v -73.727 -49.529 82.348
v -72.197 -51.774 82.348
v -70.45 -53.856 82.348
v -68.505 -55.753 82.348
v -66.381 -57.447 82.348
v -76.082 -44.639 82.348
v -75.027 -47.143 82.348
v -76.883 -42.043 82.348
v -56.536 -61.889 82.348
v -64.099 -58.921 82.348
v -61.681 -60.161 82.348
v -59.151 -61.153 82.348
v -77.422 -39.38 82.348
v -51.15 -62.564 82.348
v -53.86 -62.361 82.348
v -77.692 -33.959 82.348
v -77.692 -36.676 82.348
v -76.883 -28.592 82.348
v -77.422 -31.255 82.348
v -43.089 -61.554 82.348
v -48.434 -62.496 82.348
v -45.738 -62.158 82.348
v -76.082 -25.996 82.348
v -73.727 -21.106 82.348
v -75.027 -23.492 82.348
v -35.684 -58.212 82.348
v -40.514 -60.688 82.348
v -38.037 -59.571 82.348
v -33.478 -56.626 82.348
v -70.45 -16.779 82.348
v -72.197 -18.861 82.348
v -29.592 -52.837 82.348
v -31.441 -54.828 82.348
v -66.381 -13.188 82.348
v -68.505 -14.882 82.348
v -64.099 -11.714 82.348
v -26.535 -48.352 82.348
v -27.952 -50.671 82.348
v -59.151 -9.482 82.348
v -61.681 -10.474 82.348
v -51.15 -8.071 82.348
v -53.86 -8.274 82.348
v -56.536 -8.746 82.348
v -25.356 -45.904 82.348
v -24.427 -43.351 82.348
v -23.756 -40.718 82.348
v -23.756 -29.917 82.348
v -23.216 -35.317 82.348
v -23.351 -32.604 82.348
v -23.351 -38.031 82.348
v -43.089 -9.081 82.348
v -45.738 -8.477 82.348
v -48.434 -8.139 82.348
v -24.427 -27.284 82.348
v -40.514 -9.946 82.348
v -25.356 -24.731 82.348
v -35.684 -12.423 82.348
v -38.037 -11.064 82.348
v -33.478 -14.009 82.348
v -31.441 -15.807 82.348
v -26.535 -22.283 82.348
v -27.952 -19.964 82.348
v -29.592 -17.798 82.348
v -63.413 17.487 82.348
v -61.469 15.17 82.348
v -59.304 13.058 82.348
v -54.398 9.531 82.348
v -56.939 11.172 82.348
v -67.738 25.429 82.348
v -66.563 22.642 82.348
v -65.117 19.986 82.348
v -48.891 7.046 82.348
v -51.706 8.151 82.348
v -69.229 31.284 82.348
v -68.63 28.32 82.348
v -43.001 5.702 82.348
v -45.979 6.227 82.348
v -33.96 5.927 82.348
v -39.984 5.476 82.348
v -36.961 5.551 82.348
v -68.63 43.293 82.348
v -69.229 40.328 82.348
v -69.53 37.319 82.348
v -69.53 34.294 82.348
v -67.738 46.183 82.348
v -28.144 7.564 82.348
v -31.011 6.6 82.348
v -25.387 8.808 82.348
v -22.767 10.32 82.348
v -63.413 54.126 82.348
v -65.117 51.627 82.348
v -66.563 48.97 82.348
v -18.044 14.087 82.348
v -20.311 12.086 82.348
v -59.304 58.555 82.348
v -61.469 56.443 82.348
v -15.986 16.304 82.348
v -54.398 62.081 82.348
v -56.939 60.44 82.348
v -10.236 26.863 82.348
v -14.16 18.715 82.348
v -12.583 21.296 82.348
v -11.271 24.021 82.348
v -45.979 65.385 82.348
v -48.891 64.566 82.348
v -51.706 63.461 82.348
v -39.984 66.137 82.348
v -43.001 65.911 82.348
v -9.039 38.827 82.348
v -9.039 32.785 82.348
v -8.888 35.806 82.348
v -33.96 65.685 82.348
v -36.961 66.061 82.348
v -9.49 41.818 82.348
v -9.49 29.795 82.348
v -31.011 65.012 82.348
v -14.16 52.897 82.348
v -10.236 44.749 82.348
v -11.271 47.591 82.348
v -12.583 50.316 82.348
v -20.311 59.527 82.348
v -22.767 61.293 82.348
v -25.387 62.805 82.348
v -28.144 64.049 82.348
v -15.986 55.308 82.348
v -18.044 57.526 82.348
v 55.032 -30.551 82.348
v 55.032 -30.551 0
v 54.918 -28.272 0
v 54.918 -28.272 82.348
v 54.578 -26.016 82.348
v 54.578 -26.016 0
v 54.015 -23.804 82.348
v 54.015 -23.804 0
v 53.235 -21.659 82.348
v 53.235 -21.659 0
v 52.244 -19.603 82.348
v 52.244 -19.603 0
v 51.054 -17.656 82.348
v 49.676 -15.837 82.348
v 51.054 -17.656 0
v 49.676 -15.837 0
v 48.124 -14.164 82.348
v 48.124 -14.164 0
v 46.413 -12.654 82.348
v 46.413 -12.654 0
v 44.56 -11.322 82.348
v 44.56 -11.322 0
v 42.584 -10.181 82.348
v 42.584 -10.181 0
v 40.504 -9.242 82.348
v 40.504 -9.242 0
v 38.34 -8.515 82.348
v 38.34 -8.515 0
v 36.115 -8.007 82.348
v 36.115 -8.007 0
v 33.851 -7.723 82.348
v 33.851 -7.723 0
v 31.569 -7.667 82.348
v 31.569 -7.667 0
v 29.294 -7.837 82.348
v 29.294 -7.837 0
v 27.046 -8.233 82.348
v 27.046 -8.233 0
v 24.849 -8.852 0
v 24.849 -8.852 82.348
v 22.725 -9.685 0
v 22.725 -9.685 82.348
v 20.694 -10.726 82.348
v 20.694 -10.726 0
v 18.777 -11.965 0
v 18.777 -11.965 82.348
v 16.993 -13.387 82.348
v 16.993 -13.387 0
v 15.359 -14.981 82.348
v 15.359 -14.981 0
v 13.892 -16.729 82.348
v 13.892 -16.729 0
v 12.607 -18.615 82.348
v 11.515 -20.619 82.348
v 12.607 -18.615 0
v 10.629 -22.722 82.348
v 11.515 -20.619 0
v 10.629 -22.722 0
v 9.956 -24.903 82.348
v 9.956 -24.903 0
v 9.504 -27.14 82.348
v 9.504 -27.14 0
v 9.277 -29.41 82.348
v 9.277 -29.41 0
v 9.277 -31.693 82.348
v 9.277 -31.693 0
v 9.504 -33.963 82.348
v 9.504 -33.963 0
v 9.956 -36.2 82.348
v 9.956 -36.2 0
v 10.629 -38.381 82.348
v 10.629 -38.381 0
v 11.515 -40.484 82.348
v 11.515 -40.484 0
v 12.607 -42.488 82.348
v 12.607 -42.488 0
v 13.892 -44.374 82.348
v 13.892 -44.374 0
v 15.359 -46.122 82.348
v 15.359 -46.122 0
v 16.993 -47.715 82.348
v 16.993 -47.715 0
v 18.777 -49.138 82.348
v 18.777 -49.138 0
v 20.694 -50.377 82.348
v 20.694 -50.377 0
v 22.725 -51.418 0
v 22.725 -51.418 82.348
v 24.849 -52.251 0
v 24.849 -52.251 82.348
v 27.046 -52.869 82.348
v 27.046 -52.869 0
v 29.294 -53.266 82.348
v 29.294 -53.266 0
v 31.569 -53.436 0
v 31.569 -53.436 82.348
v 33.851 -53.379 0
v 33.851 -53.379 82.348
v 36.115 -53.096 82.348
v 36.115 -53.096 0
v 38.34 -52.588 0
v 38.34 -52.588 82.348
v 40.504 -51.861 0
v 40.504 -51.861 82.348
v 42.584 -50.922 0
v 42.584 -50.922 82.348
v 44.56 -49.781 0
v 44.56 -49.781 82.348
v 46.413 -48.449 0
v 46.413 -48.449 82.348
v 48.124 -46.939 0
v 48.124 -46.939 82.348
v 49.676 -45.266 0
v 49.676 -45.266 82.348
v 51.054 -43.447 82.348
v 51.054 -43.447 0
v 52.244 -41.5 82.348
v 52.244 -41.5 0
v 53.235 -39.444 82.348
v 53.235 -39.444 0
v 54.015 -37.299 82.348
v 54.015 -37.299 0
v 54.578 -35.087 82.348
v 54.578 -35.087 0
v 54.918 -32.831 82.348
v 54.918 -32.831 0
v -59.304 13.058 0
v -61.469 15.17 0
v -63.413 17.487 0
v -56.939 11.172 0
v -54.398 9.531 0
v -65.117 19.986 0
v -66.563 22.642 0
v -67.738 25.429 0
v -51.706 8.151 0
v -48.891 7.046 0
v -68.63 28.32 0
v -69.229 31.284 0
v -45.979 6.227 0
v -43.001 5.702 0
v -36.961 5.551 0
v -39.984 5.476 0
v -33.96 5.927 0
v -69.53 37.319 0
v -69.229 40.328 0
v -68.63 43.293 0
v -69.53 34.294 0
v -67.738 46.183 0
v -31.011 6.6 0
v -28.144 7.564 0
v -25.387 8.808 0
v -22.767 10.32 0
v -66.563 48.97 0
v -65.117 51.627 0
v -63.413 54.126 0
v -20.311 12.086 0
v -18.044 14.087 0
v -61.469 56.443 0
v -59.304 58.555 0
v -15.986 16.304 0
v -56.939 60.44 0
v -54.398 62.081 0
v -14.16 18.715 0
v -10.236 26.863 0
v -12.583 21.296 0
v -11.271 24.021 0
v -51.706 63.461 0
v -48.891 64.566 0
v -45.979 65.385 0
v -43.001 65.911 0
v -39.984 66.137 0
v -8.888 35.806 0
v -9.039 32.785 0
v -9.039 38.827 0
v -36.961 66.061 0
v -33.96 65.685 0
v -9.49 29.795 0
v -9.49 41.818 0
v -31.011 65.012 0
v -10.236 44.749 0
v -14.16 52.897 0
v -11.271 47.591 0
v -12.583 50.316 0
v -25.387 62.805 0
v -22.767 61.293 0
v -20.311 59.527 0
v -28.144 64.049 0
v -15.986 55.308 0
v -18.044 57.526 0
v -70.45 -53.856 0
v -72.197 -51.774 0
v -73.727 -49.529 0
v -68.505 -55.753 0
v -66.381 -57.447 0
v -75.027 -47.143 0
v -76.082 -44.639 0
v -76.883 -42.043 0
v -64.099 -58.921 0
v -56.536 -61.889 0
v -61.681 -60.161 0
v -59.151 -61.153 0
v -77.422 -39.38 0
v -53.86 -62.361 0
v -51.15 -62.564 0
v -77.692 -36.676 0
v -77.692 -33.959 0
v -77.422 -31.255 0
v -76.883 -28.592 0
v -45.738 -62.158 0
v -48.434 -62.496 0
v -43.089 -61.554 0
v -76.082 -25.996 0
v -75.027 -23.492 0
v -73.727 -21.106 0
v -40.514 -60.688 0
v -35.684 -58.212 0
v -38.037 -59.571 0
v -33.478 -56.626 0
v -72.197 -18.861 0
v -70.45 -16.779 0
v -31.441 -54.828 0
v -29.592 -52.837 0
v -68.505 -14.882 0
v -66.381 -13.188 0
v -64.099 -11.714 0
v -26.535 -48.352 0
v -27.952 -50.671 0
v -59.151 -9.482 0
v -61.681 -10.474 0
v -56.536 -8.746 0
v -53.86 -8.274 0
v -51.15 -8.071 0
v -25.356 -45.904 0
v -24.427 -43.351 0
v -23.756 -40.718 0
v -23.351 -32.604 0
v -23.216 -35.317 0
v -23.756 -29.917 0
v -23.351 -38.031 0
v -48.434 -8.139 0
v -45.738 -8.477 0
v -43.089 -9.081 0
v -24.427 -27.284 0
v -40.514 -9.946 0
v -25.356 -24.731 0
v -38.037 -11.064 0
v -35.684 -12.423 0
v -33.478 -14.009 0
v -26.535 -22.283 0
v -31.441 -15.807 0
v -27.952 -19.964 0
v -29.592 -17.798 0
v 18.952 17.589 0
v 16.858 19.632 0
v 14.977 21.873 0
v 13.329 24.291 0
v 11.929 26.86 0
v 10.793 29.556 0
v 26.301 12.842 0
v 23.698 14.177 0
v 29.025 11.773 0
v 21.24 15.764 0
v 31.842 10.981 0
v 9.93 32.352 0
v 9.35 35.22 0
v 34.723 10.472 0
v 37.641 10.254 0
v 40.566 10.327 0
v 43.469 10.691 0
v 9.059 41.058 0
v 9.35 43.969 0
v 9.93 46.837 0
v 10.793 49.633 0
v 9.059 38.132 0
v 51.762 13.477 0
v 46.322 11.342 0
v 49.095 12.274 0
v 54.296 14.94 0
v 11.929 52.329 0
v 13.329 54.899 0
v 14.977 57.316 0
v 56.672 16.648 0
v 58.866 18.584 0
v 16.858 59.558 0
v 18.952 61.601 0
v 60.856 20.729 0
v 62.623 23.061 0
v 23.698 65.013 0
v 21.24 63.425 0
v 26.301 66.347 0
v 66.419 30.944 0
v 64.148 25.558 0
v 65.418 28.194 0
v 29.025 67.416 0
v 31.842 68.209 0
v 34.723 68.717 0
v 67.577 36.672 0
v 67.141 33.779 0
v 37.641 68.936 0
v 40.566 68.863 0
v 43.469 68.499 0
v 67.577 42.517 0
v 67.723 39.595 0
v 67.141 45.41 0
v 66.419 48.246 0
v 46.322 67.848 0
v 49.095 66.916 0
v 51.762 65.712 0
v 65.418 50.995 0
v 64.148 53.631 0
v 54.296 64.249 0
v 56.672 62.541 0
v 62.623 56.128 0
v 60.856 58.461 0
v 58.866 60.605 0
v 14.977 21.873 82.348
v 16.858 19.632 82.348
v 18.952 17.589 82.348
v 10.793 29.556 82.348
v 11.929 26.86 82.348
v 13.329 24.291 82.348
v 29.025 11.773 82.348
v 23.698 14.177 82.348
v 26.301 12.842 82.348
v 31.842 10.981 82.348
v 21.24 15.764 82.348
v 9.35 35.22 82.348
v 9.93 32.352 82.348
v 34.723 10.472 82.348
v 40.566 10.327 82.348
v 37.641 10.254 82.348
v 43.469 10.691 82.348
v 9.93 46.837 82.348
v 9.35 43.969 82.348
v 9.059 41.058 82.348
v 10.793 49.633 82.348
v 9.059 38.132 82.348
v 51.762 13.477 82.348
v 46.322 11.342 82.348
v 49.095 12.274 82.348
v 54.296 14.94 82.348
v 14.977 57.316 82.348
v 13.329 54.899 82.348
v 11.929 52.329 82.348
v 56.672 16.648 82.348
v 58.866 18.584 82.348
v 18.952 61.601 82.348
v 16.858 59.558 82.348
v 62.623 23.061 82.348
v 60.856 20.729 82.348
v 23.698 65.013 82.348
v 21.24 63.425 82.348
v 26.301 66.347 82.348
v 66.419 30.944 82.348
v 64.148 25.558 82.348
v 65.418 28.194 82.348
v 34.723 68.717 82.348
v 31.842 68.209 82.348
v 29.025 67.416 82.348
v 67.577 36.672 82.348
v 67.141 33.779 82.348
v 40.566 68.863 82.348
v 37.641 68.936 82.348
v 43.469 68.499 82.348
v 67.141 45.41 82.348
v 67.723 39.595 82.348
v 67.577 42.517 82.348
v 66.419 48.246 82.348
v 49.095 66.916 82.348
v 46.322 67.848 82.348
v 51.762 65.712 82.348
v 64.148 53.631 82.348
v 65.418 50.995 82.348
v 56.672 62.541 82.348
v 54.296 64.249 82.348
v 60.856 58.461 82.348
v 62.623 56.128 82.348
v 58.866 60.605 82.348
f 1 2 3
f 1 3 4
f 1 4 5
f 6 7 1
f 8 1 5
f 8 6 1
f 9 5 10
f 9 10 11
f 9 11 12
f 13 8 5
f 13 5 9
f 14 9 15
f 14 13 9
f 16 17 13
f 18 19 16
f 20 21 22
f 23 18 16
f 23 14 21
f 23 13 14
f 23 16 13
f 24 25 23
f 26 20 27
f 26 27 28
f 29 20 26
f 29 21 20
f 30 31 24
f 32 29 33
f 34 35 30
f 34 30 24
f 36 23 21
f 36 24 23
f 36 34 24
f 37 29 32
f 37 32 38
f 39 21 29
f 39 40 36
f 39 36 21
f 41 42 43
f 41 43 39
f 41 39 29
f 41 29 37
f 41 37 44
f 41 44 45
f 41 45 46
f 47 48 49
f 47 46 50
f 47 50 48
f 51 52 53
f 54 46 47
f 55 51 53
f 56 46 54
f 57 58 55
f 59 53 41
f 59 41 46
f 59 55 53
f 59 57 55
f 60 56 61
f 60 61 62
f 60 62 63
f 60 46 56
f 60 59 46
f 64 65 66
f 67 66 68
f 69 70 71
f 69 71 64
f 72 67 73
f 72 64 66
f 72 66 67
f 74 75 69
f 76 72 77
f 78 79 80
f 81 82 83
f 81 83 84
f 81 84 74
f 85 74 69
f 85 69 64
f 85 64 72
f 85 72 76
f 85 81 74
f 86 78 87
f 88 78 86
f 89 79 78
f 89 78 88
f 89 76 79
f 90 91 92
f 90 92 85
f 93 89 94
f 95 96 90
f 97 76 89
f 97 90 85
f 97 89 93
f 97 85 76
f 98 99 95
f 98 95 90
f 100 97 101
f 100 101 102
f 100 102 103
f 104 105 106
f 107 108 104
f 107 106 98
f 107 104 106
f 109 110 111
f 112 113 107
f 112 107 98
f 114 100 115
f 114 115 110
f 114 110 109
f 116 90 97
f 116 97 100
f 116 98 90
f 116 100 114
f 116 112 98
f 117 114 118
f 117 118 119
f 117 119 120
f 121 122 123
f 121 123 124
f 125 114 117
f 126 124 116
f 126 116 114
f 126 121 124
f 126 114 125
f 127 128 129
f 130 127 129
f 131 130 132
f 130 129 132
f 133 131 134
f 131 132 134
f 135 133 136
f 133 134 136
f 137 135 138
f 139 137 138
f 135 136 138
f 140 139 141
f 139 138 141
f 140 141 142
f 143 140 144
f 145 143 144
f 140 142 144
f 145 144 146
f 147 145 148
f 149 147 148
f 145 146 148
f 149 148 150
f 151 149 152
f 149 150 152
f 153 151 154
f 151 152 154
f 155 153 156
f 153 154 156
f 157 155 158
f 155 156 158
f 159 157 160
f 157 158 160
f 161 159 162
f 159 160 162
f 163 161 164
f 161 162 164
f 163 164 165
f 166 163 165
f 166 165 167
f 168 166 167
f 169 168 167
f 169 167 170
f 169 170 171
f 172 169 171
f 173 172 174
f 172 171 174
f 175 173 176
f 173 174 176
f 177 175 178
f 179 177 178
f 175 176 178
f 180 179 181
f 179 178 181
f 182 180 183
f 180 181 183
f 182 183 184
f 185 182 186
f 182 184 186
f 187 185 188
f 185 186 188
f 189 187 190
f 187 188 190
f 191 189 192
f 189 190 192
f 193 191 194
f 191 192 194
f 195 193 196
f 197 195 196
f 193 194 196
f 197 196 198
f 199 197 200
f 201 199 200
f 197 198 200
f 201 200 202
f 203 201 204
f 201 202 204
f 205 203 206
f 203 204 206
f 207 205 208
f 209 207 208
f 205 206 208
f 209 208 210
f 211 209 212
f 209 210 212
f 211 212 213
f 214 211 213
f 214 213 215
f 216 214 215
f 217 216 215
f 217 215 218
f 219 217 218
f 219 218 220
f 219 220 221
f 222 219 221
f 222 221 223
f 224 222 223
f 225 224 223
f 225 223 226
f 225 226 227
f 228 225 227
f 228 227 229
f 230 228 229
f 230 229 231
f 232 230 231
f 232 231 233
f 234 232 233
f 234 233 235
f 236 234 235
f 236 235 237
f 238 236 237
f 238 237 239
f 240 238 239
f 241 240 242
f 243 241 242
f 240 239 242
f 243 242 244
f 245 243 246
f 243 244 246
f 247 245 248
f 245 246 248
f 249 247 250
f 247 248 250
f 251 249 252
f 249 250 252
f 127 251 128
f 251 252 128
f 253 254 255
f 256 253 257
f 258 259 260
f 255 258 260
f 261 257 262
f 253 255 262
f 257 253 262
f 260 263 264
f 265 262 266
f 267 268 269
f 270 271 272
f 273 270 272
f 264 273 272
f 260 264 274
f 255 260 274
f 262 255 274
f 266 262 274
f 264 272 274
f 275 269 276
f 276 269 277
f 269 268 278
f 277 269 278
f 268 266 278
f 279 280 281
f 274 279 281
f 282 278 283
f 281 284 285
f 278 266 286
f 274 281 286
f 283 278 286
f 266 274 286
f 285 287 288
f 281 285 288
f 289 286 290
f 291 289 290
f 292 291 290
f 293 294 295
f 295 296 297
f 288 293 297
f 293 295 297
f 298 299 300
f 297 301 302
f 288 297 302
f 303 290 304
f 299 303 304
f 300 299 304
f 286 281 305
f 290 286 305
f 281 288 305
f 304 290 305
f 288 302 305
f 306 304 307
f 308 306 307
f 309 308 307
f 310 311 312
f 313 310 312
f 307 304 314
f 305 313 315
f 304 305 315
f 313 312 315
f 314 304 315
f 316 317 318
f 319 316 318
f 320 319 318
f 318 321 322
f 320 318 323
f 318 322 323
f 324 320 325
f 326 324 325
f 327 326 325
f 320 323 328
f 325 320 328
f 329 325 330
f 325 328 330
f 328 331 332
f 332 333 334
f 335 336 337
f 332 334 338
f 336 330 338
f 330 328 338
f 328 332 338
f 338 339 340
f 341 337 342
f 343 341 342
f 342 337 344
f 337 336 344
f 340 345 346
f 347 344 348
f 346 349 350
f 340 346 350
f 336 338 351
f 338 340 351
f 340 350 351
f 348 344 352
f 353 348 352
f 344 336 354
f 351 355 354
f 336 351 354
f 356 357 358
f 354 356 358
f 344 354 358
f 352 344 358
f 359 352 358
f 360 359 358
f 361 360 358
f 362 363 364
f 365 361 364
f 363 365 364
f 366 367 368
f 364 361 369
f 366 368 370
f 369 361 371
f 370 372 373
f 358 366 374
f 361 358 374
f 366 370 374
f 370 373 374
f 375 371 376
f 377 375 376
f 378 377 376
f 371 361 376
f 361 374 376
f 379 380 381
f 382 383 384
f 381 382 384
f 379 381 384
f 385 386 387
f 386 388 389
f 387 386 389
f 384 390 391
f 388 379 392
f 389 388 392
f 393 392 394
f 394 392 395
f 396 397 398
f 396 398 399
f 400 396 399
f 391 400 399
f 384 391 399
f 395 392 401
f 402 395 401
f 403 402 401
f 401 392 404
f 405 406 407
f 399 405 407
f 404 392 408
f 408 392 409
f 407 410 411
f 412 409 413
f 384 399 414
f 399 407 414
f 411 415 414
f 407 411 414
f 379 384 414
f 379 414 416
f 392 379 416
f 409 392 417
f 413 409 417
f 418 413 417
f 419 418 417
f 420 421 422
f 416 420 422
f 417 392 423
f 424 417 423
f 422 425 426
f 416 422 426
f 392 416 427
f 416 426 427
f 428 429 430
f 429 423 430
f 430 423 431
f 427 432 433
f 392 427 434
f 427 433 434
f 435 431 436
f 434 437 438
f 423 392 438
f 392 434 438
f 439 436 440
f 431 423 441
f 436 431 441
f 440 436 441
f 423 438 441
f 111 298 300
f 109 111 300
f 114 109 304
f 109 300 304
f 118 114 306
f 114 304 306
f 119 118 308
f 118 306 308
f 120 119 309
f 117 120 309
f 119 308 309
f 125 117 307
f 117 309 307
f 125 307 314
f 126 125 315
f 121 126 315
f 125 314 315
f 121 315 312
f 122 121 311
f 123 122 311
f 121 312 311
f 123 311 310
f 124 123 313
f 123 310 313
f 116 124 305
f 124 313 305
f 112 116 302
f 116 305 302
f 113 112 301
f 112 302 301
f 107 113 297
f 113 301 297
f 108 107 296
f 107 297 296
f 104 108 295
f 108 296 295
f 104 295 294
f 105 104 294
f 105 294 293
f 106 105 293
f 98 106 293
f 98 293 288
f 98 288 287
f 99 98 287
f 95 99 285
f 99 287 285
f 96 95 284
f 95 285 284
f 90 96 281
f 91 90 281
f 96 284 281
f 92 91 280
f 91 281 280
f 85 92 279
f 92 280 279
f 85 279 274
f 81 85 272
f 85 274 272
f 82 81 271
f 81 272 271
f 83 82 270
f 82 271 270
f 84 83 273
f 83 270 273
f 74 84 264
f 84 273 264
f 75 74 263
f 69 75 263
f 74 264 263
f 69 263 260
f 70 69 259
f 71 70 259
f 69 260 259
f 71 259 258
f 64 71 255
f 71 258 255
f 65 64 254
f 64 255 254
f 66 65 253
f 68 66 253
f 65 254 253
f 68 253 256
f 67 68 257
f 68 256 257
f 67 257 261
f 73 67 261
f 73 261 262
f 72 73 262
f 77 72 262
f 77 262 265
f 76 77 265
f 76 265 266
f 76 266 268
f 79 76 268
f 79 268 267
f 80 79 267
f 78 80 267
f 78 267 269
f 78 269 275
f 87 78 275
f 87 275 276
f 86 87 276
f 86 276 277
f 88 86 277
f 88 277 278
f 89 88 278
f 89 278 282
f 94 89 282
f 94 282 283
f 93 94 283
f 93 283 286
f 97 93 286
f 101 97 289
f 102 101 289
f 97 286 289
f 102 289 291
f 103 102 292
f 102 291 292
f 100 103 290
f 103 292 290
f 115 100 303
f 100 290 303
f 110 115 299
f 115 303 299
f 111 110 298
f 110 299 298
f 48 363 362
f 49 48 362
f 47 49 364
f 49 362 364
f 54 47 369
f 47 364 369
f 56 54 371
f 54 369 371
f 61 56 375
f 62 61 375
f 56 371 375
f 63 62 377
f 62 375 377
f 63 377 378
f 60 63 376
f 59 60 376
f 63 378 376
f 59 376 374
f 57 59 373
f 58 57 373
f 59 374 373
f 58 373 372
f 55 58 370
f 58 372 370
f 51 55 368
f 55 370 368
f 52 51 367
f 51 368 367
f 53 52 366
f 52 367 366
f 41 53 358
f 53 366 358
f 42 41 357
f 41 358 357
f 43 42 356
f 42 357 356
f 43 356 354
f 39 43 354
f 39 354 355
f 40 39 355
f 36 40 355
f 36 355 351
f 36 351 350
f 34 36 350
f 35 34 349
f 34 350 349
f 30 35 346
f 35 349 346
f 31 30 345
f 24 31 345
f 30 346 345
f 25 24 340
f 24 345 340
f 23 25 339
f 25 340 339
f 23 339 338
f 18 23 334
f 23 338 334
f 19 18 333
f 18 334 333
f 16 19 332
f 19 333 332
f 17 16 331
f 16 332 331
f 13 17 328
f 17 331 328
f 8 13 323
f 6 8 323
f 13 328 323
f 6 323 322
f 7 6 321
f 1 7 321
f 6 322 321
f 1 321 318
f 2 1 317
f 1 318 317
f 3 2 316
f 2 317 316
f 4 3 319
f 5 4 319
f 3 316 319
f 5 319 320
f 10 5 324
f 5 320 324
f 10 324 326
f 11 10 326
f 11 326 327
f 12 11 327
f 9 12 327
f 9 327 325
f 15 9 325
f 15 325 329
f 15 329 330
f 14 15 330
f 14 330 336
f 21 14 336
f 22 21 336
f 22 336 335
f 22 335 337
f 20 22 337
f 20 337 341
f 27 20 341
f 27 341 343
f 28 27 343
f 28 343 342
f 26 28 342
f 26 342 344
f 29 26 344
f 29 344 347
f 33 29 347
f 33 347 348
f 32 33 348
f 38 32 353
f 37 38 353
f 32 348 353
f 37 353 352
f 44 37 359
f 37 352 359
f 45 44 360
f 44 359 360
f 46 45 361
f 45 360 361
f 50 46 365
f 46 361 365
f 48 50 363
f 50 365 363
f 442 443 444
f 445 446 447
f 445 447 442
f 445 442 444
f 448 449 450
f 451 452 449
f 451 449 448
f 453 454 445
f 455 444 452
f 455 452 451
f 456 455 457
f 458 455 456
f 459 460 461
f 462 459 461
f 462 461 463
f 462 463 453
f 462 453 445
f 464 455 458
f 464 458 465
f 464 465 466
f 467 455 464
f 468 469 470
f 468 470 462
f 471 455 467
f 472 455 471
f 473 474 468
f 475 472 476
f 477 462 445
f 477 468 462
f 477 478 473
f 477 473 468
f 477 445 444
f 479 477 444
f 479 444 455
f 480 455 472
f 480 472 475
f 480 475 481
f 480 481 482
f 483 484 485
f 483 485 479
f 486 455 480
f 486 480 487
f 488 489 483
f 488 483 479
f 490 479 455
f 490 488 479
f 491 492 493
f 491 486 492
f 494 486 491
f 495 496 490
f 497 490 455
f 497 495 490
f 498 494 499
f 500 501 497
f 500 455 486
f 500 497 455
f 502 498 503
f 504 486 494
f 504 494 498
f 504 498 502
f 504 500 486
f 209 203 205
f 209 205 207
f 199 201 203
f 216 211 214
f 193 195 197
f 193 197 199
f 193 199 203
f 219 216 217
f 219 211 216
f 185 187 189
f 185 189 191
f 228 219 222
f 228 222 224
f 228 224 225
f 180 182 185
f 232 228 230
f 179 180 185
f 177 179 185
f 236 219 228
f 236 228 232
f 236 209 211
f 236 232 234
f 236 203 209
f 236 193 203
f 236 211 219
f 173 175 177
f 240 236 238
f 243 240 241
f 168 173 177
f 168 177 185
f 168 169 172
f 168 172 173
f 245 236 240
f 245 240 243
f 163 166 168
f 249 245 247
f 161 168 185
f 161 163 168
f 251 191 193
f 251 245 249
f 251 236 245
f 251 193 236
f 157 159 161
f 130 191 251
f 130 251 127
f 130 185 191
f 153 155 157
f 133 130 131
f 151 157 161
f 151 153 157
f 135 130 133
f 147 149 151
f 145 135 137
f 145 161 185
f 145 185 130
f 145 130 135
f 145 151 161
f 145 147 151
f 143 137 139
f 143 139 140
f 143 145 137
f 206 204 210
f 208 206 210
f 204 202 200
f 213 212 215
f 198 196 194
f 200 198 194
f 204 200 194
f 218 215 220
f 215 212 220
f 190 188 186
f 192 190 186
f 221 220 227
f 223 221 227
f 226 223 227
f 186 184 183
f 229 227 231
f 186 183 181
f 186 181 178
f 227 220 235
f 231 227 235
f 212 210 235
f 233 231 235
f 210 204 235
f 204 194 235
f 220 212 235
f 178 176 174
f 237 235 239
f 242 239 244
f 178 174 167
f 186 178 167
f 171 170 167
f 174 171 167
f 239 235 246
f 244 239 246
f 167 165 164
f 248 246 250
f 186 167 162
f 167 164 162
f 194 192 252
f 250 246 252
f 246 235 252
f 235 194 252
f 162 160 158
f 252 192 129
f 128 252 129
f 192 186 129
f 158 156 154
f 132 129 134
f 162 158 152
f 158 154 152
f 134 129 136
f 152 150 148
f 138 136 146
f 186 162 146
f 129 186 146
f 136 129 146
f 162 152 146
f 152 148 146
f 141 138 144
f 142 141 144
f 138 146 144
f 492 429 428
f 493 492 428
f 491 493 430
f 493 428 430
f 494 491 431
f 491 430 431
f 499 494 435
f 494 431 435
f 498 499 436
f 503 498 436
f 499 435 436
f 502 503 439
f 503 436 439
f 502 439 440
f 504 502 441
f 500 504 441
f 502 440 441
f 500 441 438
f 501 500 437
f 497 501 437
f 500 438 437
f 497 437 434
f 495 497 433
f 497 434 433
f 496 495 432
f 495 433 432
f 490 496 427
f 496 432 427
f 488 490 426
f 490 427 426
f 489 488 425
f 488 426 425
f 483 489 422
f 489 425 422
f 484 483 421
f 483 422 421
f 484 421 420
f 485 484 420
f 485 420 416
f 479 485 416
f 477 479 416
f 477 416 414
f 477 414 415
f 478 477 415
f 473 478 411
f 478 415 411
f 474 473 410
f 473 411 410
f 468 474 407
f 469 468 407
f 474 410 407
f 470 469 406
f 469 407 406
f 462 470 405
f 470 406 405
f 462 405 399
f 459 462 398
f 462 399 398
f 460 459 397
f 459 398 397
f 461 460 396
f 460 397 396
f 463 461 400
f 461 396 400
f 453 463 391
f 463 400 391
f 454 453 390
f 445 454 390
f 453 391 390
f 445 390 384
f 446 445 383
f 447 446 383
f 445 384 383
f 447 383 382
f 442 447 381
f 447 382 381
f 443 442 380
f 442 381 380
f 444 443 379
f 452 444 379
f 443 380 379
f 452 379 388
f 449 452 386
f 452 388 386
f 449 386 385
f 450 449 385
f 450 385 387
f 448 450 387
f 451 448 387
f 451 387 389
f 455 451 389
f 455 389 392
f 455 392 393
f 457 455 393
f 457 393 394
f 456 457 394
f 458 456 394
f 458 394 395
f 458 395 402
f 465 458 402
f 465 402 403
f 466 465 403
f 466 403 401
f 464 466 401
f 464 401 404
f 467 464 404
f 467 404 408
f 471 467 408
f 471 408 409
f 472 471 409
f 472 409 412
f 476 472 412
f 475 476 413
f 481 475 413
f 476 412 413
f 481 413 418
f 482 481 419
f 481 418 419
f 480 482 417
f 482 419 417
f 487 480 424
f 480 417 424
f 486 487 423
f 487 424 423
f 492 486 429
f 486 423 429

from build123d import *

# Parameters (mm, degrees)
F0_R     = 30.33987
F0_R_2   = 29.350011
F0_R_3   = 22.891983
F0_R_4   = 27.25504
F1_DEPTH = 82.348295


with BuildPart() as f1:
    # F0 (on Top) → F1 (new body)
    with BuildSketch(Plane.XY):
        with Locations((-39.228059, 35.806298)):
            Circle(F0_R)
        with Locations((38.372621, 39.59468)):
            Circle(F0_R_2)
        with Locations((32.140136, -30.551463)):
            Circle(F0_R_3)
        with Locations((-50.470993, -35.317481)):
            Circle(F0_R_4)
    extrude(amount=F1_DEPTH)


solid = f1.part
